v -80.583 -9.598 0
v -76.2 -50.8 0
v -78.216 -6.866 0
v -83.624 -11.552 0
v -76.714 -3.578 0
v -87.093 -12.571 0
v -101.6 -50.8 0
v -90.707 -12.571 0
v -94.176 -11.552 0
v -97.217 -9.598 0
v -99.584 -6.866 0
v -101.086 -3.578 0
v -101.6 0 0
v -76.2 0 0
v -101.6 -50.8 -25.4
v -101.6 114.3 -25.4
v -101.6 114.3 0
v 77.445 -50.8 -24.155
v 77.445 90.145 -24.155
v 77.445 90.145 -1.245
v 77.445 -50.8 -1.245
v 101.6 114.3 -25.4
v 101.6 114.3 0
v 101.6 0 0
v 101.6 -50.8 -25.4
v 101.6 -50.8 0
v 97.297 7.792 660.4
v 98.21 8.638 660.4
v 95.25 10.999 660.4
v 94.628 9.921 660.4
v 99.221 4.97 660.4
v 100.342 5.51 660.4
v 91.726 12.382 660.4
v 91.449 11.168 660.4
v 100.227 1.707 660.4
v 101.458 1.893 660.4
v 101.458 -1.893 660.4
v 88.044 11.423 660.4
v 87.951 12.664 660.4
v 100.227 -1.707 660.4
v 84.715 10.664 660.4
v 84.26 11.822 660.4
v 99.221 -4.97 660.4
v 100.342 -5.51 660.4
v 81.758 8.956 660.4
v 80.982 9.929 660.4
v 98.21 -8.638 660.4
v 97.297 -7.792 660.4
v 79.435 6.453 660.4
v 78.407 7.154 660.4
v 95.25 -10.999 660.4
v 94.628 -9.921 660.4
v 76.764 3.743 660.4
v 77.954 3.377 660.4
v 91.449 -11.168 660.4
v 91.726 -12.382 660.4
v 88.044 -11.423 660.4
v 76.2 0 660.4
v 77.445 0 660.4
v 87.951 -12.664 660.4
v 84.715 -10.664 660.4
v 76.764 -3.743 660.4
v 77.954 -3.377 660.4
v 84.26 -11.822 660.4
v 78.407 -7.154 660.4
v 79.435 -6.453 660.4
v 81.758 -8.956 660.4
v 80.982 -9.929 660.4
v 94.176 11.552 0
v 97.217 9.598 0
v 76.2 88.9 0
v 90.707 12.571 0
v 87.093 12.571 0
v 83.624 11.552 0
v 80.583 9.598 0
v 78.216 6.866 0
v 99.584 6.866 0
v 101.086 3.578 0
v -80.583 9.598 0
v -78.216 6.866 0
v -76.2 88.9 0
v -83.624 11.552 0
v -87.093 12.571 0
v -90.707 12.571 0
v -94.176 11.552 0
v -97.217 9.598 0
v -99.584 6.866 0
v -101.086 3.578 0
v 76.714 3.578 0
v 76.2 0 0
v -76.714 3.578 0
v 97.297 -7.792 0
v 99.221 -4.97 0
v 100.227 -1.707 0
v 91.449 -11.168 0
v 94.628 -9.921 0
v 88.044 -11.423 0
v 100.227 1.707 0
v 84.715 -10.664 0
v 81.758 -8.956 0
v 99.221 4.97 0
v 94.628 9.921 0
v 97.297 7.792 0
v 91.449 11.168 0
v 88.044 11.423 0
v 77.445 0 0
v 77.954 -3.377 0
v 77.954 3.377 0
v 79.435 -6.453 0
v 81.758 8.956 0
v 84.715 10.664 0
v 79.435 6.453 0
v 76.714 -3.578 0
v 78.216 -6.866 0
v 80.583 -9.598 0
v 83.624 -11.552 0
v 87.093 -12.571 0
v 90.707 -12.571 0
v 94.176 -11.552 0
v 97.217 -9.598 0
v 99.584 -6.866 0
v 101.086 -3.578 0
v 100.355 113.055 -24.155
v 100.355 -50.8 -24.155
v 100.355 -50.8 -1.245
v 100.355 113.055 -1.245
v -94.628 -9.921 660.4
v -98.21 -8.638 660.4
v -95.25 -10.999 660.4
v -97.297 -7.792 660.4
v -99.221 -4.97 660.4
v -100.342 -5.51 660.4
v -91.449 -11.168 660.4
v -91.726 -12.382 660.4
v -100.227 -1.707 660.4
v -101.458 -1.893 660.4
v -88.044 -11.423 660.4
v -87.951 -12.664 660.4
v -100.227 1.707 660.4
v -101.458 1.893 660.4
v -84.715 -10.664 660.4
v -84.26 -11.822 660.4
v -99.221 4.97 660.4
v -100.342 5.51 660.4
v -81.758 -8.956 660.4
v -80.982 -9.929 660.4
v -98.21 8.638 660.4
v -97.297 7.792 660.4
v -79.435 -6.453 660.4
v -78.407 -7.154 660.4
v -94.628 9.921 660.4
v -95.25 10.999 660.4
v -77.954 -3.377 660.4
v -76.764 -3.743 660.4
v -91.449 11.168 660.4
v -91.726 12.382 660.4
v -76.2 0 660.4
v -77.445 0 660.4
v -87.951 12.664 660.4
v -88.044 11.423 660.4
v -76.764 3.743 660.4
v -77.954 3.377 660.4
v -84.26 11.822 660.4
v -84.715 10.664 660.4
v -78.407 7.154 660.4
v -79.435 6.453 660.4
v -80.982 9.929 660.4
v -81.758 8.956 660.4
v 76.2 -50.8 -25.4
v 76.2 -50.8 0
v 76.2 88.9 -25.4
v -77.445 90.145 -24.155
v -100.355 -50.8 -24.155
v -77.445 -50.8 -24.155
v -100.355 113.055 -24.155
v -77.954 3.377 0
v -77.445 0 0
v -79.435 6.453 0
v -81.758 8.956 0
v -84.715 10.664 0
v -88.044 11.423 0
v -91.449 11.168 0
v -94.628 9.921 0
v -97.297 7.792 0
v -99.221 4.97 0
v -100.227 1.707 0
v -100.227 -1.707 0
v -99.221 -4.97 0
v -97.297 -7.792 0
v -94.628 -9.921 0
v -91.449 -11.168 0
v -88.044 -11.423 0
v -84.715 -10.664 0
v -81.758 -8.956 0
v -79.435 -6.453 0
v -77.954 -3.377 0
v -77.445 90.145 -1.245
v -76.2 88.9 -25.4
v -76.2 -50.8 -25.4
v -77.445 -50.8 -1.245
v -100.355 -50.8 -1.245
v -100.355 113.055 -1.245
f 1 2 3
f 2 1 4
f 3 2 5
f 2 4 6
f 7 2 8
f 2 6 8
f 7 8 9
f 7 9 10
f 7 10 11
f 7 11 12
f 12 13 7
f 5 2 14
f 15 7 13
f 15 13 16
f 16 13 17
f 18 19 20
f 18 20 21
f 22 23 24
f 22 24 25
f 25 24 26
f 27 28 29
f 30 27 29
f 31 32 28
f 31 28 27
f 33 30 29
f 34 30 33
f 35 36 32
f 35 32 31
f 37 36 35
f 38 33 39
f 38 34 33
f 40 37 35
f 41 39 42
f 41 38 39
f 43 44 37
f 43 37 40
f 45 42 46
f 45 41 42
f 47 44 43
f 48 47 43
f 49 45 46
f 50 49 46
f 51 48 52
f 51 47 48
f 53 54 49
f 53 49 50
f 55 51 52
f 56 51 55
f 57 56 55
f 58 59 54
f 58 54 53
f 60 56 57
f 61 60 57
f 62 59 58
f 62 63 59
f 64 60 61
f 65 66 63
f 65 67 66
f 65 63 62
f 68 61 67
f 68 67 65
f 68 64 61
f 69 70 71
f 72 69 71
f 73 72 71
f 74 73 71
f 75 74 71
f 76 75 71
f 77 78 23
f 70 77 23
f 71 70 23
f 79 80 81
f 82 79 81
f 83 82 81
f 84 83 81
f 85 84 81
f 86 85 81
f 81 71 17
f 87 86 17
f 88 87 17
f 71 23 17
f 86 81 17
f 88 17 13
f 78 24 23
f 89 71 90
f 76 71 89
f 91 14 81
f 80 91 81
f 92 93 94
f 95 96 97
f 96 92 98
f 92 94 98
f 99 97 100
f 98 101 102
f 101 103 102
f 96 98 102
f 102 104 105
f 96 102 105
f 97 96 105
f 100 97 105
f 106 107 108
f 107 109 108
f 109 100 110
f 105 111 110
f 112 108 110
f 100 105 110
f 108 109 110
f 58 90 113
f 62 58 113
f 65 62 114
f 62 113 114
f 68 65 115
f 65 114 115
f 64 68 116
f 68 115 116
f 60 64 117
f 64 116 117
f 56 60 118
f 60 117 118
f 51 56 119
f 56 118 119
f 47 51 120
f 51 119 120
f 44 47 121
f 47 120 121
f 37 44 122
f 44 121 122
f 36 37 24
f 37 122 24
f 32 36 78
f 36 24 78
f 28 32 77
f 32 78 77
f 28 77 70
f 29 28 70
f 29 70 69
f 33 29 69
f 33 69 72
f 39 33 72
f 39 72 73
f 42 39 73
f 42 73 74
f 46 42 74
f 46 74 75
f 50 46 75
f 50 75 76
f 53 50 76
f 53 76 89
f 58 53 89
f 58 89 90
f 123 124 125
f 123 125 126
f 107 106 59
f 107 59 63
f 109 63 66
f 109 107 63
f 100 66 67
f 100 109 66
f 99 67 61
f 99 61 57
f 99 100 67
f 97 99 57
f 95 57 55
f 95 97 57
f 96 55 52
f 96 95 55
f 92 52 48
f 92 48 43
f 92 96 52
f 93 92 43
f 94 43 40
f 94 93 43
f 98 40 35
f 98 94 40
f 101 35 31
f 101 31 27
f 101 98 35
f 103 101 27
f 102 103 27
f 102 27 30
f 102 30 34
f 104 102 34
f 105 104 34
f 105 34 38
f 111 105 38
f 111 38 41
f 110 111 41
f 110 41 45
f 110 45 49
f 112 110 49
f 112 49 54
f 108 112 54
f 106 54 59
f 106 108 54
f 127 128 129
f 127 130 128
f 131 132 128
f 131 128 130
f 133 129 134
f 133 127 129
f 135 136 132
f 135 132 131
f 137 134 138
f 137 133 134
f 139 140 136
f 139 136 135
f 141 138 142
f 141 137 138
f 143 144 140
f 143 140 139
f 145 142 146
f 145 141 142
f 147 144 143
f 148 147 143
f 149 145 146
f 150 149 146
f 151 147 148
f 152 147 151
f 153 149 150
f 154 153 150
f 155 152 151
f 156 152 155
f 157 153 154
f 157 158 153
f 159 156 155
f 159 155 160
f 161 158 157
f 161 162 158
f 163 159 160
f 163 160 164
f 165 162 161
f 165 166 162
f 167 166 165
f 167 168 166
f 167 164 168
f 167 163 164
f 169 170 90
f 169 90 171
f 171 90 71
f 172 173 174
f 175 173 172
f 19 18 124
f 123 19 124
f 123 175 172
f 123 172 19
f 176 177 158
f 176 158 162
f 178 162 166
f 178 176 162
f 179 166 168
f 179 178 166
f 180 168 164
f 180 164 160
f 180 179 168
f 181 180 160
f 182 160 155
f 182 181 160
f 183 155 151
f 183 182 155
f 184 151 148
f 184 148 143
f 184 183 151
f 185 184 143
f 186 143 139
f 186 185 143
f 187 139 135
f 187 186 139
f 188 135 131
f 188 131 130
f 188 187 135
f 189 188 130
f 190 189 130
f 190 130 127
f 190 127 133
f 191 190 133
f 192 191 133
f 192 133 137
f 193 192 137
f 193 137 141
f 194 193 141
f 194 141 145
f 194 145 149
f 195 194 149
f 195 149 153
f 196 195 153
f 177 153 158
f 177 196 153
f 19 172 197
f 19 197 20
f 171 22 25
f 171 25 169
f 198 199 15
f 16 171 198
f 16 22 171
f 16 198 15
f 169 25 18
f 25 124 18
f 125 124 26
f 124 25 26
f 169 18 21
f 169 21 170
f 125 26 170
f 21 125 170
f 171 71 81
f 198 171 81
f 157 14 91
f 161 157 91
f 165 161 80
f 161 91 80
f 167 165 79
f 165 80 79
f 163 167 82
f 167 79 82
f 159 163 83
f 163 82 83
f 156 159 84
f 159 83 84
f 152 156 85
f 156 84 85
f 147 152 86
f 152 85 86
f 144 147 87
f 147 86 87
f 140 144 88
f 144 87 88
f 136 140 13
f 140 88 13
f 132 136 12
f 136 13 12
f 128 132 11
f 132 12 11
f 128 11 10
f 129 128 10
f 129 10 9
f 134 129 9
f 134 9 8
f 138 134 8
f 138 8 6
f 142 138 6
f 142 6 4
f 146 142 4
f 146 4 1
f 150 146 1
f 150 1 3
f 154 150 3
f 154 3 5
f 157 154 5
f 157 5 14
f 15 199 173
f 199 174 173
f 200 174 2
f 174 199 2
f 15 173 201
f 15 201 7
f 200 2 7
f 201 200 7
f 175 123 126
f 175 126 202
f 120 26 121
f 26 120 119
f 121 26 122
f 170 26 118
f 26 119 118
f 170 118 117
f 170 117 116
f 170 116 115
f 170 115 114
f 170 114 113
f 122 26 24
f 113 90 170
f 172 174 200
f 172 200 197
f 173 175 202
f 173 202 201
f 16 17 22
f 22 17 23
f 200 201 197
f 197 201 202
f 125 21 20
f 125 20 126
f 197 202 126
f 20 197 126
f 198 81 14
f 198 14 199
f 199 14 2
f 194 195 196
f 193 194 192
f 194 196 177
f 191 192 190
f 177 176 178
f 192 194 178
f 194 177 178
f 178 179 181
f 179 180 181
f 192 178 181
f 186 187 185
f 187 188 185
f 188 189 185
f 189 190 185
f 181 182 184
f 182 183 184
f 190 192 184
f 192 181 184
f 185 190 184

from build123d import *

# Parameters (mm, degrees)
SKETCH1_R             = 12.7
SKETCH1_R_2           = 11.4554
BOSS_EXTRUDE1_DEPTH   = 660.4
BOSS_EXTRUDE1_2_DEPTH = 660.4
BOSS_EXTRUDE2_DEPTH   = 25.4
SHELL1_START          = -24.1554
SHELL1_DEPTH          = 22.9108


# Read off the part's stored shape, not the designer's step: Shell1
with BuildPart() as part:
    # Sketch1 → Boss-Extrude1 (new body)
    with BuildSketch(Plane.XY):
        with Locations((-88.9, 0)):
            Circle(SKETCH1_R)
        with Locations((-88.9, 0)):
            Circle(SKETCH1_R_2, mode=Mode.SUBTRACT)
    extrude(amount=BOSS_EXTRUDE1_DEPTH)



with BuildPart() as body_2:
    # Sketch1 → Boss-Extrude1 2 (new body)
    with BuildSketch(Plane.XY):
        with Locations(Location((88.9, 0, 0), (0, 0, 180))):
            Circle(SKETCH1_R)
        with Locations(Location((88.9, 0, 0), (0, 0, 180))):
            Circle(SKETCH1_R_2, mode=Mode.SUBTRACT)
    extrude(amount=BOSS_EXTRUDE1_2_DEPTH)


with BuildPart() as part_1:
    add(part.part)

    add(body_2.part)  # Boss-Extrude2 merges body 2
    # Sketch2 → Boss-Extrude2 (add)
    with BuildSketch(Plane(origin=(0, 0, 0), x_dir=(-1, 0, 0), z_dir=(0, 0, -1))):
        Polygon((101.6, 0), (101.6, 114.3), (-101.6, 114.3), (-101.6, 0), (-101.6, -50.8), (-76.2, -50.8), (-76.2, 0), (-76.2, 88.9), (76.2, 88.9), (76.2, 0), (76.2, -50.8), (101.6, -50.8), align=None)
    extrude(amount=BOSS_EXTRUDE2_DEPTH)

    # Shell1 outline → Shell1 (cut)
    with BuildSketch(Plane.XY.offset(SHELL1_START)):
        Polygon((-100.3554, 113.0554), (-100.3554, -50.8), (-77.4446, -50.8), (-77.4446, 90.1446), (77.4446, 90.1446), (77.4446, -50.8), (100.3554, -50.8), (100.3554, 113.0554), align=None)
    extrude(amount=SHELL1_DEPTH, mode=Mode.SUBTRACT)


solid = part_1.part
